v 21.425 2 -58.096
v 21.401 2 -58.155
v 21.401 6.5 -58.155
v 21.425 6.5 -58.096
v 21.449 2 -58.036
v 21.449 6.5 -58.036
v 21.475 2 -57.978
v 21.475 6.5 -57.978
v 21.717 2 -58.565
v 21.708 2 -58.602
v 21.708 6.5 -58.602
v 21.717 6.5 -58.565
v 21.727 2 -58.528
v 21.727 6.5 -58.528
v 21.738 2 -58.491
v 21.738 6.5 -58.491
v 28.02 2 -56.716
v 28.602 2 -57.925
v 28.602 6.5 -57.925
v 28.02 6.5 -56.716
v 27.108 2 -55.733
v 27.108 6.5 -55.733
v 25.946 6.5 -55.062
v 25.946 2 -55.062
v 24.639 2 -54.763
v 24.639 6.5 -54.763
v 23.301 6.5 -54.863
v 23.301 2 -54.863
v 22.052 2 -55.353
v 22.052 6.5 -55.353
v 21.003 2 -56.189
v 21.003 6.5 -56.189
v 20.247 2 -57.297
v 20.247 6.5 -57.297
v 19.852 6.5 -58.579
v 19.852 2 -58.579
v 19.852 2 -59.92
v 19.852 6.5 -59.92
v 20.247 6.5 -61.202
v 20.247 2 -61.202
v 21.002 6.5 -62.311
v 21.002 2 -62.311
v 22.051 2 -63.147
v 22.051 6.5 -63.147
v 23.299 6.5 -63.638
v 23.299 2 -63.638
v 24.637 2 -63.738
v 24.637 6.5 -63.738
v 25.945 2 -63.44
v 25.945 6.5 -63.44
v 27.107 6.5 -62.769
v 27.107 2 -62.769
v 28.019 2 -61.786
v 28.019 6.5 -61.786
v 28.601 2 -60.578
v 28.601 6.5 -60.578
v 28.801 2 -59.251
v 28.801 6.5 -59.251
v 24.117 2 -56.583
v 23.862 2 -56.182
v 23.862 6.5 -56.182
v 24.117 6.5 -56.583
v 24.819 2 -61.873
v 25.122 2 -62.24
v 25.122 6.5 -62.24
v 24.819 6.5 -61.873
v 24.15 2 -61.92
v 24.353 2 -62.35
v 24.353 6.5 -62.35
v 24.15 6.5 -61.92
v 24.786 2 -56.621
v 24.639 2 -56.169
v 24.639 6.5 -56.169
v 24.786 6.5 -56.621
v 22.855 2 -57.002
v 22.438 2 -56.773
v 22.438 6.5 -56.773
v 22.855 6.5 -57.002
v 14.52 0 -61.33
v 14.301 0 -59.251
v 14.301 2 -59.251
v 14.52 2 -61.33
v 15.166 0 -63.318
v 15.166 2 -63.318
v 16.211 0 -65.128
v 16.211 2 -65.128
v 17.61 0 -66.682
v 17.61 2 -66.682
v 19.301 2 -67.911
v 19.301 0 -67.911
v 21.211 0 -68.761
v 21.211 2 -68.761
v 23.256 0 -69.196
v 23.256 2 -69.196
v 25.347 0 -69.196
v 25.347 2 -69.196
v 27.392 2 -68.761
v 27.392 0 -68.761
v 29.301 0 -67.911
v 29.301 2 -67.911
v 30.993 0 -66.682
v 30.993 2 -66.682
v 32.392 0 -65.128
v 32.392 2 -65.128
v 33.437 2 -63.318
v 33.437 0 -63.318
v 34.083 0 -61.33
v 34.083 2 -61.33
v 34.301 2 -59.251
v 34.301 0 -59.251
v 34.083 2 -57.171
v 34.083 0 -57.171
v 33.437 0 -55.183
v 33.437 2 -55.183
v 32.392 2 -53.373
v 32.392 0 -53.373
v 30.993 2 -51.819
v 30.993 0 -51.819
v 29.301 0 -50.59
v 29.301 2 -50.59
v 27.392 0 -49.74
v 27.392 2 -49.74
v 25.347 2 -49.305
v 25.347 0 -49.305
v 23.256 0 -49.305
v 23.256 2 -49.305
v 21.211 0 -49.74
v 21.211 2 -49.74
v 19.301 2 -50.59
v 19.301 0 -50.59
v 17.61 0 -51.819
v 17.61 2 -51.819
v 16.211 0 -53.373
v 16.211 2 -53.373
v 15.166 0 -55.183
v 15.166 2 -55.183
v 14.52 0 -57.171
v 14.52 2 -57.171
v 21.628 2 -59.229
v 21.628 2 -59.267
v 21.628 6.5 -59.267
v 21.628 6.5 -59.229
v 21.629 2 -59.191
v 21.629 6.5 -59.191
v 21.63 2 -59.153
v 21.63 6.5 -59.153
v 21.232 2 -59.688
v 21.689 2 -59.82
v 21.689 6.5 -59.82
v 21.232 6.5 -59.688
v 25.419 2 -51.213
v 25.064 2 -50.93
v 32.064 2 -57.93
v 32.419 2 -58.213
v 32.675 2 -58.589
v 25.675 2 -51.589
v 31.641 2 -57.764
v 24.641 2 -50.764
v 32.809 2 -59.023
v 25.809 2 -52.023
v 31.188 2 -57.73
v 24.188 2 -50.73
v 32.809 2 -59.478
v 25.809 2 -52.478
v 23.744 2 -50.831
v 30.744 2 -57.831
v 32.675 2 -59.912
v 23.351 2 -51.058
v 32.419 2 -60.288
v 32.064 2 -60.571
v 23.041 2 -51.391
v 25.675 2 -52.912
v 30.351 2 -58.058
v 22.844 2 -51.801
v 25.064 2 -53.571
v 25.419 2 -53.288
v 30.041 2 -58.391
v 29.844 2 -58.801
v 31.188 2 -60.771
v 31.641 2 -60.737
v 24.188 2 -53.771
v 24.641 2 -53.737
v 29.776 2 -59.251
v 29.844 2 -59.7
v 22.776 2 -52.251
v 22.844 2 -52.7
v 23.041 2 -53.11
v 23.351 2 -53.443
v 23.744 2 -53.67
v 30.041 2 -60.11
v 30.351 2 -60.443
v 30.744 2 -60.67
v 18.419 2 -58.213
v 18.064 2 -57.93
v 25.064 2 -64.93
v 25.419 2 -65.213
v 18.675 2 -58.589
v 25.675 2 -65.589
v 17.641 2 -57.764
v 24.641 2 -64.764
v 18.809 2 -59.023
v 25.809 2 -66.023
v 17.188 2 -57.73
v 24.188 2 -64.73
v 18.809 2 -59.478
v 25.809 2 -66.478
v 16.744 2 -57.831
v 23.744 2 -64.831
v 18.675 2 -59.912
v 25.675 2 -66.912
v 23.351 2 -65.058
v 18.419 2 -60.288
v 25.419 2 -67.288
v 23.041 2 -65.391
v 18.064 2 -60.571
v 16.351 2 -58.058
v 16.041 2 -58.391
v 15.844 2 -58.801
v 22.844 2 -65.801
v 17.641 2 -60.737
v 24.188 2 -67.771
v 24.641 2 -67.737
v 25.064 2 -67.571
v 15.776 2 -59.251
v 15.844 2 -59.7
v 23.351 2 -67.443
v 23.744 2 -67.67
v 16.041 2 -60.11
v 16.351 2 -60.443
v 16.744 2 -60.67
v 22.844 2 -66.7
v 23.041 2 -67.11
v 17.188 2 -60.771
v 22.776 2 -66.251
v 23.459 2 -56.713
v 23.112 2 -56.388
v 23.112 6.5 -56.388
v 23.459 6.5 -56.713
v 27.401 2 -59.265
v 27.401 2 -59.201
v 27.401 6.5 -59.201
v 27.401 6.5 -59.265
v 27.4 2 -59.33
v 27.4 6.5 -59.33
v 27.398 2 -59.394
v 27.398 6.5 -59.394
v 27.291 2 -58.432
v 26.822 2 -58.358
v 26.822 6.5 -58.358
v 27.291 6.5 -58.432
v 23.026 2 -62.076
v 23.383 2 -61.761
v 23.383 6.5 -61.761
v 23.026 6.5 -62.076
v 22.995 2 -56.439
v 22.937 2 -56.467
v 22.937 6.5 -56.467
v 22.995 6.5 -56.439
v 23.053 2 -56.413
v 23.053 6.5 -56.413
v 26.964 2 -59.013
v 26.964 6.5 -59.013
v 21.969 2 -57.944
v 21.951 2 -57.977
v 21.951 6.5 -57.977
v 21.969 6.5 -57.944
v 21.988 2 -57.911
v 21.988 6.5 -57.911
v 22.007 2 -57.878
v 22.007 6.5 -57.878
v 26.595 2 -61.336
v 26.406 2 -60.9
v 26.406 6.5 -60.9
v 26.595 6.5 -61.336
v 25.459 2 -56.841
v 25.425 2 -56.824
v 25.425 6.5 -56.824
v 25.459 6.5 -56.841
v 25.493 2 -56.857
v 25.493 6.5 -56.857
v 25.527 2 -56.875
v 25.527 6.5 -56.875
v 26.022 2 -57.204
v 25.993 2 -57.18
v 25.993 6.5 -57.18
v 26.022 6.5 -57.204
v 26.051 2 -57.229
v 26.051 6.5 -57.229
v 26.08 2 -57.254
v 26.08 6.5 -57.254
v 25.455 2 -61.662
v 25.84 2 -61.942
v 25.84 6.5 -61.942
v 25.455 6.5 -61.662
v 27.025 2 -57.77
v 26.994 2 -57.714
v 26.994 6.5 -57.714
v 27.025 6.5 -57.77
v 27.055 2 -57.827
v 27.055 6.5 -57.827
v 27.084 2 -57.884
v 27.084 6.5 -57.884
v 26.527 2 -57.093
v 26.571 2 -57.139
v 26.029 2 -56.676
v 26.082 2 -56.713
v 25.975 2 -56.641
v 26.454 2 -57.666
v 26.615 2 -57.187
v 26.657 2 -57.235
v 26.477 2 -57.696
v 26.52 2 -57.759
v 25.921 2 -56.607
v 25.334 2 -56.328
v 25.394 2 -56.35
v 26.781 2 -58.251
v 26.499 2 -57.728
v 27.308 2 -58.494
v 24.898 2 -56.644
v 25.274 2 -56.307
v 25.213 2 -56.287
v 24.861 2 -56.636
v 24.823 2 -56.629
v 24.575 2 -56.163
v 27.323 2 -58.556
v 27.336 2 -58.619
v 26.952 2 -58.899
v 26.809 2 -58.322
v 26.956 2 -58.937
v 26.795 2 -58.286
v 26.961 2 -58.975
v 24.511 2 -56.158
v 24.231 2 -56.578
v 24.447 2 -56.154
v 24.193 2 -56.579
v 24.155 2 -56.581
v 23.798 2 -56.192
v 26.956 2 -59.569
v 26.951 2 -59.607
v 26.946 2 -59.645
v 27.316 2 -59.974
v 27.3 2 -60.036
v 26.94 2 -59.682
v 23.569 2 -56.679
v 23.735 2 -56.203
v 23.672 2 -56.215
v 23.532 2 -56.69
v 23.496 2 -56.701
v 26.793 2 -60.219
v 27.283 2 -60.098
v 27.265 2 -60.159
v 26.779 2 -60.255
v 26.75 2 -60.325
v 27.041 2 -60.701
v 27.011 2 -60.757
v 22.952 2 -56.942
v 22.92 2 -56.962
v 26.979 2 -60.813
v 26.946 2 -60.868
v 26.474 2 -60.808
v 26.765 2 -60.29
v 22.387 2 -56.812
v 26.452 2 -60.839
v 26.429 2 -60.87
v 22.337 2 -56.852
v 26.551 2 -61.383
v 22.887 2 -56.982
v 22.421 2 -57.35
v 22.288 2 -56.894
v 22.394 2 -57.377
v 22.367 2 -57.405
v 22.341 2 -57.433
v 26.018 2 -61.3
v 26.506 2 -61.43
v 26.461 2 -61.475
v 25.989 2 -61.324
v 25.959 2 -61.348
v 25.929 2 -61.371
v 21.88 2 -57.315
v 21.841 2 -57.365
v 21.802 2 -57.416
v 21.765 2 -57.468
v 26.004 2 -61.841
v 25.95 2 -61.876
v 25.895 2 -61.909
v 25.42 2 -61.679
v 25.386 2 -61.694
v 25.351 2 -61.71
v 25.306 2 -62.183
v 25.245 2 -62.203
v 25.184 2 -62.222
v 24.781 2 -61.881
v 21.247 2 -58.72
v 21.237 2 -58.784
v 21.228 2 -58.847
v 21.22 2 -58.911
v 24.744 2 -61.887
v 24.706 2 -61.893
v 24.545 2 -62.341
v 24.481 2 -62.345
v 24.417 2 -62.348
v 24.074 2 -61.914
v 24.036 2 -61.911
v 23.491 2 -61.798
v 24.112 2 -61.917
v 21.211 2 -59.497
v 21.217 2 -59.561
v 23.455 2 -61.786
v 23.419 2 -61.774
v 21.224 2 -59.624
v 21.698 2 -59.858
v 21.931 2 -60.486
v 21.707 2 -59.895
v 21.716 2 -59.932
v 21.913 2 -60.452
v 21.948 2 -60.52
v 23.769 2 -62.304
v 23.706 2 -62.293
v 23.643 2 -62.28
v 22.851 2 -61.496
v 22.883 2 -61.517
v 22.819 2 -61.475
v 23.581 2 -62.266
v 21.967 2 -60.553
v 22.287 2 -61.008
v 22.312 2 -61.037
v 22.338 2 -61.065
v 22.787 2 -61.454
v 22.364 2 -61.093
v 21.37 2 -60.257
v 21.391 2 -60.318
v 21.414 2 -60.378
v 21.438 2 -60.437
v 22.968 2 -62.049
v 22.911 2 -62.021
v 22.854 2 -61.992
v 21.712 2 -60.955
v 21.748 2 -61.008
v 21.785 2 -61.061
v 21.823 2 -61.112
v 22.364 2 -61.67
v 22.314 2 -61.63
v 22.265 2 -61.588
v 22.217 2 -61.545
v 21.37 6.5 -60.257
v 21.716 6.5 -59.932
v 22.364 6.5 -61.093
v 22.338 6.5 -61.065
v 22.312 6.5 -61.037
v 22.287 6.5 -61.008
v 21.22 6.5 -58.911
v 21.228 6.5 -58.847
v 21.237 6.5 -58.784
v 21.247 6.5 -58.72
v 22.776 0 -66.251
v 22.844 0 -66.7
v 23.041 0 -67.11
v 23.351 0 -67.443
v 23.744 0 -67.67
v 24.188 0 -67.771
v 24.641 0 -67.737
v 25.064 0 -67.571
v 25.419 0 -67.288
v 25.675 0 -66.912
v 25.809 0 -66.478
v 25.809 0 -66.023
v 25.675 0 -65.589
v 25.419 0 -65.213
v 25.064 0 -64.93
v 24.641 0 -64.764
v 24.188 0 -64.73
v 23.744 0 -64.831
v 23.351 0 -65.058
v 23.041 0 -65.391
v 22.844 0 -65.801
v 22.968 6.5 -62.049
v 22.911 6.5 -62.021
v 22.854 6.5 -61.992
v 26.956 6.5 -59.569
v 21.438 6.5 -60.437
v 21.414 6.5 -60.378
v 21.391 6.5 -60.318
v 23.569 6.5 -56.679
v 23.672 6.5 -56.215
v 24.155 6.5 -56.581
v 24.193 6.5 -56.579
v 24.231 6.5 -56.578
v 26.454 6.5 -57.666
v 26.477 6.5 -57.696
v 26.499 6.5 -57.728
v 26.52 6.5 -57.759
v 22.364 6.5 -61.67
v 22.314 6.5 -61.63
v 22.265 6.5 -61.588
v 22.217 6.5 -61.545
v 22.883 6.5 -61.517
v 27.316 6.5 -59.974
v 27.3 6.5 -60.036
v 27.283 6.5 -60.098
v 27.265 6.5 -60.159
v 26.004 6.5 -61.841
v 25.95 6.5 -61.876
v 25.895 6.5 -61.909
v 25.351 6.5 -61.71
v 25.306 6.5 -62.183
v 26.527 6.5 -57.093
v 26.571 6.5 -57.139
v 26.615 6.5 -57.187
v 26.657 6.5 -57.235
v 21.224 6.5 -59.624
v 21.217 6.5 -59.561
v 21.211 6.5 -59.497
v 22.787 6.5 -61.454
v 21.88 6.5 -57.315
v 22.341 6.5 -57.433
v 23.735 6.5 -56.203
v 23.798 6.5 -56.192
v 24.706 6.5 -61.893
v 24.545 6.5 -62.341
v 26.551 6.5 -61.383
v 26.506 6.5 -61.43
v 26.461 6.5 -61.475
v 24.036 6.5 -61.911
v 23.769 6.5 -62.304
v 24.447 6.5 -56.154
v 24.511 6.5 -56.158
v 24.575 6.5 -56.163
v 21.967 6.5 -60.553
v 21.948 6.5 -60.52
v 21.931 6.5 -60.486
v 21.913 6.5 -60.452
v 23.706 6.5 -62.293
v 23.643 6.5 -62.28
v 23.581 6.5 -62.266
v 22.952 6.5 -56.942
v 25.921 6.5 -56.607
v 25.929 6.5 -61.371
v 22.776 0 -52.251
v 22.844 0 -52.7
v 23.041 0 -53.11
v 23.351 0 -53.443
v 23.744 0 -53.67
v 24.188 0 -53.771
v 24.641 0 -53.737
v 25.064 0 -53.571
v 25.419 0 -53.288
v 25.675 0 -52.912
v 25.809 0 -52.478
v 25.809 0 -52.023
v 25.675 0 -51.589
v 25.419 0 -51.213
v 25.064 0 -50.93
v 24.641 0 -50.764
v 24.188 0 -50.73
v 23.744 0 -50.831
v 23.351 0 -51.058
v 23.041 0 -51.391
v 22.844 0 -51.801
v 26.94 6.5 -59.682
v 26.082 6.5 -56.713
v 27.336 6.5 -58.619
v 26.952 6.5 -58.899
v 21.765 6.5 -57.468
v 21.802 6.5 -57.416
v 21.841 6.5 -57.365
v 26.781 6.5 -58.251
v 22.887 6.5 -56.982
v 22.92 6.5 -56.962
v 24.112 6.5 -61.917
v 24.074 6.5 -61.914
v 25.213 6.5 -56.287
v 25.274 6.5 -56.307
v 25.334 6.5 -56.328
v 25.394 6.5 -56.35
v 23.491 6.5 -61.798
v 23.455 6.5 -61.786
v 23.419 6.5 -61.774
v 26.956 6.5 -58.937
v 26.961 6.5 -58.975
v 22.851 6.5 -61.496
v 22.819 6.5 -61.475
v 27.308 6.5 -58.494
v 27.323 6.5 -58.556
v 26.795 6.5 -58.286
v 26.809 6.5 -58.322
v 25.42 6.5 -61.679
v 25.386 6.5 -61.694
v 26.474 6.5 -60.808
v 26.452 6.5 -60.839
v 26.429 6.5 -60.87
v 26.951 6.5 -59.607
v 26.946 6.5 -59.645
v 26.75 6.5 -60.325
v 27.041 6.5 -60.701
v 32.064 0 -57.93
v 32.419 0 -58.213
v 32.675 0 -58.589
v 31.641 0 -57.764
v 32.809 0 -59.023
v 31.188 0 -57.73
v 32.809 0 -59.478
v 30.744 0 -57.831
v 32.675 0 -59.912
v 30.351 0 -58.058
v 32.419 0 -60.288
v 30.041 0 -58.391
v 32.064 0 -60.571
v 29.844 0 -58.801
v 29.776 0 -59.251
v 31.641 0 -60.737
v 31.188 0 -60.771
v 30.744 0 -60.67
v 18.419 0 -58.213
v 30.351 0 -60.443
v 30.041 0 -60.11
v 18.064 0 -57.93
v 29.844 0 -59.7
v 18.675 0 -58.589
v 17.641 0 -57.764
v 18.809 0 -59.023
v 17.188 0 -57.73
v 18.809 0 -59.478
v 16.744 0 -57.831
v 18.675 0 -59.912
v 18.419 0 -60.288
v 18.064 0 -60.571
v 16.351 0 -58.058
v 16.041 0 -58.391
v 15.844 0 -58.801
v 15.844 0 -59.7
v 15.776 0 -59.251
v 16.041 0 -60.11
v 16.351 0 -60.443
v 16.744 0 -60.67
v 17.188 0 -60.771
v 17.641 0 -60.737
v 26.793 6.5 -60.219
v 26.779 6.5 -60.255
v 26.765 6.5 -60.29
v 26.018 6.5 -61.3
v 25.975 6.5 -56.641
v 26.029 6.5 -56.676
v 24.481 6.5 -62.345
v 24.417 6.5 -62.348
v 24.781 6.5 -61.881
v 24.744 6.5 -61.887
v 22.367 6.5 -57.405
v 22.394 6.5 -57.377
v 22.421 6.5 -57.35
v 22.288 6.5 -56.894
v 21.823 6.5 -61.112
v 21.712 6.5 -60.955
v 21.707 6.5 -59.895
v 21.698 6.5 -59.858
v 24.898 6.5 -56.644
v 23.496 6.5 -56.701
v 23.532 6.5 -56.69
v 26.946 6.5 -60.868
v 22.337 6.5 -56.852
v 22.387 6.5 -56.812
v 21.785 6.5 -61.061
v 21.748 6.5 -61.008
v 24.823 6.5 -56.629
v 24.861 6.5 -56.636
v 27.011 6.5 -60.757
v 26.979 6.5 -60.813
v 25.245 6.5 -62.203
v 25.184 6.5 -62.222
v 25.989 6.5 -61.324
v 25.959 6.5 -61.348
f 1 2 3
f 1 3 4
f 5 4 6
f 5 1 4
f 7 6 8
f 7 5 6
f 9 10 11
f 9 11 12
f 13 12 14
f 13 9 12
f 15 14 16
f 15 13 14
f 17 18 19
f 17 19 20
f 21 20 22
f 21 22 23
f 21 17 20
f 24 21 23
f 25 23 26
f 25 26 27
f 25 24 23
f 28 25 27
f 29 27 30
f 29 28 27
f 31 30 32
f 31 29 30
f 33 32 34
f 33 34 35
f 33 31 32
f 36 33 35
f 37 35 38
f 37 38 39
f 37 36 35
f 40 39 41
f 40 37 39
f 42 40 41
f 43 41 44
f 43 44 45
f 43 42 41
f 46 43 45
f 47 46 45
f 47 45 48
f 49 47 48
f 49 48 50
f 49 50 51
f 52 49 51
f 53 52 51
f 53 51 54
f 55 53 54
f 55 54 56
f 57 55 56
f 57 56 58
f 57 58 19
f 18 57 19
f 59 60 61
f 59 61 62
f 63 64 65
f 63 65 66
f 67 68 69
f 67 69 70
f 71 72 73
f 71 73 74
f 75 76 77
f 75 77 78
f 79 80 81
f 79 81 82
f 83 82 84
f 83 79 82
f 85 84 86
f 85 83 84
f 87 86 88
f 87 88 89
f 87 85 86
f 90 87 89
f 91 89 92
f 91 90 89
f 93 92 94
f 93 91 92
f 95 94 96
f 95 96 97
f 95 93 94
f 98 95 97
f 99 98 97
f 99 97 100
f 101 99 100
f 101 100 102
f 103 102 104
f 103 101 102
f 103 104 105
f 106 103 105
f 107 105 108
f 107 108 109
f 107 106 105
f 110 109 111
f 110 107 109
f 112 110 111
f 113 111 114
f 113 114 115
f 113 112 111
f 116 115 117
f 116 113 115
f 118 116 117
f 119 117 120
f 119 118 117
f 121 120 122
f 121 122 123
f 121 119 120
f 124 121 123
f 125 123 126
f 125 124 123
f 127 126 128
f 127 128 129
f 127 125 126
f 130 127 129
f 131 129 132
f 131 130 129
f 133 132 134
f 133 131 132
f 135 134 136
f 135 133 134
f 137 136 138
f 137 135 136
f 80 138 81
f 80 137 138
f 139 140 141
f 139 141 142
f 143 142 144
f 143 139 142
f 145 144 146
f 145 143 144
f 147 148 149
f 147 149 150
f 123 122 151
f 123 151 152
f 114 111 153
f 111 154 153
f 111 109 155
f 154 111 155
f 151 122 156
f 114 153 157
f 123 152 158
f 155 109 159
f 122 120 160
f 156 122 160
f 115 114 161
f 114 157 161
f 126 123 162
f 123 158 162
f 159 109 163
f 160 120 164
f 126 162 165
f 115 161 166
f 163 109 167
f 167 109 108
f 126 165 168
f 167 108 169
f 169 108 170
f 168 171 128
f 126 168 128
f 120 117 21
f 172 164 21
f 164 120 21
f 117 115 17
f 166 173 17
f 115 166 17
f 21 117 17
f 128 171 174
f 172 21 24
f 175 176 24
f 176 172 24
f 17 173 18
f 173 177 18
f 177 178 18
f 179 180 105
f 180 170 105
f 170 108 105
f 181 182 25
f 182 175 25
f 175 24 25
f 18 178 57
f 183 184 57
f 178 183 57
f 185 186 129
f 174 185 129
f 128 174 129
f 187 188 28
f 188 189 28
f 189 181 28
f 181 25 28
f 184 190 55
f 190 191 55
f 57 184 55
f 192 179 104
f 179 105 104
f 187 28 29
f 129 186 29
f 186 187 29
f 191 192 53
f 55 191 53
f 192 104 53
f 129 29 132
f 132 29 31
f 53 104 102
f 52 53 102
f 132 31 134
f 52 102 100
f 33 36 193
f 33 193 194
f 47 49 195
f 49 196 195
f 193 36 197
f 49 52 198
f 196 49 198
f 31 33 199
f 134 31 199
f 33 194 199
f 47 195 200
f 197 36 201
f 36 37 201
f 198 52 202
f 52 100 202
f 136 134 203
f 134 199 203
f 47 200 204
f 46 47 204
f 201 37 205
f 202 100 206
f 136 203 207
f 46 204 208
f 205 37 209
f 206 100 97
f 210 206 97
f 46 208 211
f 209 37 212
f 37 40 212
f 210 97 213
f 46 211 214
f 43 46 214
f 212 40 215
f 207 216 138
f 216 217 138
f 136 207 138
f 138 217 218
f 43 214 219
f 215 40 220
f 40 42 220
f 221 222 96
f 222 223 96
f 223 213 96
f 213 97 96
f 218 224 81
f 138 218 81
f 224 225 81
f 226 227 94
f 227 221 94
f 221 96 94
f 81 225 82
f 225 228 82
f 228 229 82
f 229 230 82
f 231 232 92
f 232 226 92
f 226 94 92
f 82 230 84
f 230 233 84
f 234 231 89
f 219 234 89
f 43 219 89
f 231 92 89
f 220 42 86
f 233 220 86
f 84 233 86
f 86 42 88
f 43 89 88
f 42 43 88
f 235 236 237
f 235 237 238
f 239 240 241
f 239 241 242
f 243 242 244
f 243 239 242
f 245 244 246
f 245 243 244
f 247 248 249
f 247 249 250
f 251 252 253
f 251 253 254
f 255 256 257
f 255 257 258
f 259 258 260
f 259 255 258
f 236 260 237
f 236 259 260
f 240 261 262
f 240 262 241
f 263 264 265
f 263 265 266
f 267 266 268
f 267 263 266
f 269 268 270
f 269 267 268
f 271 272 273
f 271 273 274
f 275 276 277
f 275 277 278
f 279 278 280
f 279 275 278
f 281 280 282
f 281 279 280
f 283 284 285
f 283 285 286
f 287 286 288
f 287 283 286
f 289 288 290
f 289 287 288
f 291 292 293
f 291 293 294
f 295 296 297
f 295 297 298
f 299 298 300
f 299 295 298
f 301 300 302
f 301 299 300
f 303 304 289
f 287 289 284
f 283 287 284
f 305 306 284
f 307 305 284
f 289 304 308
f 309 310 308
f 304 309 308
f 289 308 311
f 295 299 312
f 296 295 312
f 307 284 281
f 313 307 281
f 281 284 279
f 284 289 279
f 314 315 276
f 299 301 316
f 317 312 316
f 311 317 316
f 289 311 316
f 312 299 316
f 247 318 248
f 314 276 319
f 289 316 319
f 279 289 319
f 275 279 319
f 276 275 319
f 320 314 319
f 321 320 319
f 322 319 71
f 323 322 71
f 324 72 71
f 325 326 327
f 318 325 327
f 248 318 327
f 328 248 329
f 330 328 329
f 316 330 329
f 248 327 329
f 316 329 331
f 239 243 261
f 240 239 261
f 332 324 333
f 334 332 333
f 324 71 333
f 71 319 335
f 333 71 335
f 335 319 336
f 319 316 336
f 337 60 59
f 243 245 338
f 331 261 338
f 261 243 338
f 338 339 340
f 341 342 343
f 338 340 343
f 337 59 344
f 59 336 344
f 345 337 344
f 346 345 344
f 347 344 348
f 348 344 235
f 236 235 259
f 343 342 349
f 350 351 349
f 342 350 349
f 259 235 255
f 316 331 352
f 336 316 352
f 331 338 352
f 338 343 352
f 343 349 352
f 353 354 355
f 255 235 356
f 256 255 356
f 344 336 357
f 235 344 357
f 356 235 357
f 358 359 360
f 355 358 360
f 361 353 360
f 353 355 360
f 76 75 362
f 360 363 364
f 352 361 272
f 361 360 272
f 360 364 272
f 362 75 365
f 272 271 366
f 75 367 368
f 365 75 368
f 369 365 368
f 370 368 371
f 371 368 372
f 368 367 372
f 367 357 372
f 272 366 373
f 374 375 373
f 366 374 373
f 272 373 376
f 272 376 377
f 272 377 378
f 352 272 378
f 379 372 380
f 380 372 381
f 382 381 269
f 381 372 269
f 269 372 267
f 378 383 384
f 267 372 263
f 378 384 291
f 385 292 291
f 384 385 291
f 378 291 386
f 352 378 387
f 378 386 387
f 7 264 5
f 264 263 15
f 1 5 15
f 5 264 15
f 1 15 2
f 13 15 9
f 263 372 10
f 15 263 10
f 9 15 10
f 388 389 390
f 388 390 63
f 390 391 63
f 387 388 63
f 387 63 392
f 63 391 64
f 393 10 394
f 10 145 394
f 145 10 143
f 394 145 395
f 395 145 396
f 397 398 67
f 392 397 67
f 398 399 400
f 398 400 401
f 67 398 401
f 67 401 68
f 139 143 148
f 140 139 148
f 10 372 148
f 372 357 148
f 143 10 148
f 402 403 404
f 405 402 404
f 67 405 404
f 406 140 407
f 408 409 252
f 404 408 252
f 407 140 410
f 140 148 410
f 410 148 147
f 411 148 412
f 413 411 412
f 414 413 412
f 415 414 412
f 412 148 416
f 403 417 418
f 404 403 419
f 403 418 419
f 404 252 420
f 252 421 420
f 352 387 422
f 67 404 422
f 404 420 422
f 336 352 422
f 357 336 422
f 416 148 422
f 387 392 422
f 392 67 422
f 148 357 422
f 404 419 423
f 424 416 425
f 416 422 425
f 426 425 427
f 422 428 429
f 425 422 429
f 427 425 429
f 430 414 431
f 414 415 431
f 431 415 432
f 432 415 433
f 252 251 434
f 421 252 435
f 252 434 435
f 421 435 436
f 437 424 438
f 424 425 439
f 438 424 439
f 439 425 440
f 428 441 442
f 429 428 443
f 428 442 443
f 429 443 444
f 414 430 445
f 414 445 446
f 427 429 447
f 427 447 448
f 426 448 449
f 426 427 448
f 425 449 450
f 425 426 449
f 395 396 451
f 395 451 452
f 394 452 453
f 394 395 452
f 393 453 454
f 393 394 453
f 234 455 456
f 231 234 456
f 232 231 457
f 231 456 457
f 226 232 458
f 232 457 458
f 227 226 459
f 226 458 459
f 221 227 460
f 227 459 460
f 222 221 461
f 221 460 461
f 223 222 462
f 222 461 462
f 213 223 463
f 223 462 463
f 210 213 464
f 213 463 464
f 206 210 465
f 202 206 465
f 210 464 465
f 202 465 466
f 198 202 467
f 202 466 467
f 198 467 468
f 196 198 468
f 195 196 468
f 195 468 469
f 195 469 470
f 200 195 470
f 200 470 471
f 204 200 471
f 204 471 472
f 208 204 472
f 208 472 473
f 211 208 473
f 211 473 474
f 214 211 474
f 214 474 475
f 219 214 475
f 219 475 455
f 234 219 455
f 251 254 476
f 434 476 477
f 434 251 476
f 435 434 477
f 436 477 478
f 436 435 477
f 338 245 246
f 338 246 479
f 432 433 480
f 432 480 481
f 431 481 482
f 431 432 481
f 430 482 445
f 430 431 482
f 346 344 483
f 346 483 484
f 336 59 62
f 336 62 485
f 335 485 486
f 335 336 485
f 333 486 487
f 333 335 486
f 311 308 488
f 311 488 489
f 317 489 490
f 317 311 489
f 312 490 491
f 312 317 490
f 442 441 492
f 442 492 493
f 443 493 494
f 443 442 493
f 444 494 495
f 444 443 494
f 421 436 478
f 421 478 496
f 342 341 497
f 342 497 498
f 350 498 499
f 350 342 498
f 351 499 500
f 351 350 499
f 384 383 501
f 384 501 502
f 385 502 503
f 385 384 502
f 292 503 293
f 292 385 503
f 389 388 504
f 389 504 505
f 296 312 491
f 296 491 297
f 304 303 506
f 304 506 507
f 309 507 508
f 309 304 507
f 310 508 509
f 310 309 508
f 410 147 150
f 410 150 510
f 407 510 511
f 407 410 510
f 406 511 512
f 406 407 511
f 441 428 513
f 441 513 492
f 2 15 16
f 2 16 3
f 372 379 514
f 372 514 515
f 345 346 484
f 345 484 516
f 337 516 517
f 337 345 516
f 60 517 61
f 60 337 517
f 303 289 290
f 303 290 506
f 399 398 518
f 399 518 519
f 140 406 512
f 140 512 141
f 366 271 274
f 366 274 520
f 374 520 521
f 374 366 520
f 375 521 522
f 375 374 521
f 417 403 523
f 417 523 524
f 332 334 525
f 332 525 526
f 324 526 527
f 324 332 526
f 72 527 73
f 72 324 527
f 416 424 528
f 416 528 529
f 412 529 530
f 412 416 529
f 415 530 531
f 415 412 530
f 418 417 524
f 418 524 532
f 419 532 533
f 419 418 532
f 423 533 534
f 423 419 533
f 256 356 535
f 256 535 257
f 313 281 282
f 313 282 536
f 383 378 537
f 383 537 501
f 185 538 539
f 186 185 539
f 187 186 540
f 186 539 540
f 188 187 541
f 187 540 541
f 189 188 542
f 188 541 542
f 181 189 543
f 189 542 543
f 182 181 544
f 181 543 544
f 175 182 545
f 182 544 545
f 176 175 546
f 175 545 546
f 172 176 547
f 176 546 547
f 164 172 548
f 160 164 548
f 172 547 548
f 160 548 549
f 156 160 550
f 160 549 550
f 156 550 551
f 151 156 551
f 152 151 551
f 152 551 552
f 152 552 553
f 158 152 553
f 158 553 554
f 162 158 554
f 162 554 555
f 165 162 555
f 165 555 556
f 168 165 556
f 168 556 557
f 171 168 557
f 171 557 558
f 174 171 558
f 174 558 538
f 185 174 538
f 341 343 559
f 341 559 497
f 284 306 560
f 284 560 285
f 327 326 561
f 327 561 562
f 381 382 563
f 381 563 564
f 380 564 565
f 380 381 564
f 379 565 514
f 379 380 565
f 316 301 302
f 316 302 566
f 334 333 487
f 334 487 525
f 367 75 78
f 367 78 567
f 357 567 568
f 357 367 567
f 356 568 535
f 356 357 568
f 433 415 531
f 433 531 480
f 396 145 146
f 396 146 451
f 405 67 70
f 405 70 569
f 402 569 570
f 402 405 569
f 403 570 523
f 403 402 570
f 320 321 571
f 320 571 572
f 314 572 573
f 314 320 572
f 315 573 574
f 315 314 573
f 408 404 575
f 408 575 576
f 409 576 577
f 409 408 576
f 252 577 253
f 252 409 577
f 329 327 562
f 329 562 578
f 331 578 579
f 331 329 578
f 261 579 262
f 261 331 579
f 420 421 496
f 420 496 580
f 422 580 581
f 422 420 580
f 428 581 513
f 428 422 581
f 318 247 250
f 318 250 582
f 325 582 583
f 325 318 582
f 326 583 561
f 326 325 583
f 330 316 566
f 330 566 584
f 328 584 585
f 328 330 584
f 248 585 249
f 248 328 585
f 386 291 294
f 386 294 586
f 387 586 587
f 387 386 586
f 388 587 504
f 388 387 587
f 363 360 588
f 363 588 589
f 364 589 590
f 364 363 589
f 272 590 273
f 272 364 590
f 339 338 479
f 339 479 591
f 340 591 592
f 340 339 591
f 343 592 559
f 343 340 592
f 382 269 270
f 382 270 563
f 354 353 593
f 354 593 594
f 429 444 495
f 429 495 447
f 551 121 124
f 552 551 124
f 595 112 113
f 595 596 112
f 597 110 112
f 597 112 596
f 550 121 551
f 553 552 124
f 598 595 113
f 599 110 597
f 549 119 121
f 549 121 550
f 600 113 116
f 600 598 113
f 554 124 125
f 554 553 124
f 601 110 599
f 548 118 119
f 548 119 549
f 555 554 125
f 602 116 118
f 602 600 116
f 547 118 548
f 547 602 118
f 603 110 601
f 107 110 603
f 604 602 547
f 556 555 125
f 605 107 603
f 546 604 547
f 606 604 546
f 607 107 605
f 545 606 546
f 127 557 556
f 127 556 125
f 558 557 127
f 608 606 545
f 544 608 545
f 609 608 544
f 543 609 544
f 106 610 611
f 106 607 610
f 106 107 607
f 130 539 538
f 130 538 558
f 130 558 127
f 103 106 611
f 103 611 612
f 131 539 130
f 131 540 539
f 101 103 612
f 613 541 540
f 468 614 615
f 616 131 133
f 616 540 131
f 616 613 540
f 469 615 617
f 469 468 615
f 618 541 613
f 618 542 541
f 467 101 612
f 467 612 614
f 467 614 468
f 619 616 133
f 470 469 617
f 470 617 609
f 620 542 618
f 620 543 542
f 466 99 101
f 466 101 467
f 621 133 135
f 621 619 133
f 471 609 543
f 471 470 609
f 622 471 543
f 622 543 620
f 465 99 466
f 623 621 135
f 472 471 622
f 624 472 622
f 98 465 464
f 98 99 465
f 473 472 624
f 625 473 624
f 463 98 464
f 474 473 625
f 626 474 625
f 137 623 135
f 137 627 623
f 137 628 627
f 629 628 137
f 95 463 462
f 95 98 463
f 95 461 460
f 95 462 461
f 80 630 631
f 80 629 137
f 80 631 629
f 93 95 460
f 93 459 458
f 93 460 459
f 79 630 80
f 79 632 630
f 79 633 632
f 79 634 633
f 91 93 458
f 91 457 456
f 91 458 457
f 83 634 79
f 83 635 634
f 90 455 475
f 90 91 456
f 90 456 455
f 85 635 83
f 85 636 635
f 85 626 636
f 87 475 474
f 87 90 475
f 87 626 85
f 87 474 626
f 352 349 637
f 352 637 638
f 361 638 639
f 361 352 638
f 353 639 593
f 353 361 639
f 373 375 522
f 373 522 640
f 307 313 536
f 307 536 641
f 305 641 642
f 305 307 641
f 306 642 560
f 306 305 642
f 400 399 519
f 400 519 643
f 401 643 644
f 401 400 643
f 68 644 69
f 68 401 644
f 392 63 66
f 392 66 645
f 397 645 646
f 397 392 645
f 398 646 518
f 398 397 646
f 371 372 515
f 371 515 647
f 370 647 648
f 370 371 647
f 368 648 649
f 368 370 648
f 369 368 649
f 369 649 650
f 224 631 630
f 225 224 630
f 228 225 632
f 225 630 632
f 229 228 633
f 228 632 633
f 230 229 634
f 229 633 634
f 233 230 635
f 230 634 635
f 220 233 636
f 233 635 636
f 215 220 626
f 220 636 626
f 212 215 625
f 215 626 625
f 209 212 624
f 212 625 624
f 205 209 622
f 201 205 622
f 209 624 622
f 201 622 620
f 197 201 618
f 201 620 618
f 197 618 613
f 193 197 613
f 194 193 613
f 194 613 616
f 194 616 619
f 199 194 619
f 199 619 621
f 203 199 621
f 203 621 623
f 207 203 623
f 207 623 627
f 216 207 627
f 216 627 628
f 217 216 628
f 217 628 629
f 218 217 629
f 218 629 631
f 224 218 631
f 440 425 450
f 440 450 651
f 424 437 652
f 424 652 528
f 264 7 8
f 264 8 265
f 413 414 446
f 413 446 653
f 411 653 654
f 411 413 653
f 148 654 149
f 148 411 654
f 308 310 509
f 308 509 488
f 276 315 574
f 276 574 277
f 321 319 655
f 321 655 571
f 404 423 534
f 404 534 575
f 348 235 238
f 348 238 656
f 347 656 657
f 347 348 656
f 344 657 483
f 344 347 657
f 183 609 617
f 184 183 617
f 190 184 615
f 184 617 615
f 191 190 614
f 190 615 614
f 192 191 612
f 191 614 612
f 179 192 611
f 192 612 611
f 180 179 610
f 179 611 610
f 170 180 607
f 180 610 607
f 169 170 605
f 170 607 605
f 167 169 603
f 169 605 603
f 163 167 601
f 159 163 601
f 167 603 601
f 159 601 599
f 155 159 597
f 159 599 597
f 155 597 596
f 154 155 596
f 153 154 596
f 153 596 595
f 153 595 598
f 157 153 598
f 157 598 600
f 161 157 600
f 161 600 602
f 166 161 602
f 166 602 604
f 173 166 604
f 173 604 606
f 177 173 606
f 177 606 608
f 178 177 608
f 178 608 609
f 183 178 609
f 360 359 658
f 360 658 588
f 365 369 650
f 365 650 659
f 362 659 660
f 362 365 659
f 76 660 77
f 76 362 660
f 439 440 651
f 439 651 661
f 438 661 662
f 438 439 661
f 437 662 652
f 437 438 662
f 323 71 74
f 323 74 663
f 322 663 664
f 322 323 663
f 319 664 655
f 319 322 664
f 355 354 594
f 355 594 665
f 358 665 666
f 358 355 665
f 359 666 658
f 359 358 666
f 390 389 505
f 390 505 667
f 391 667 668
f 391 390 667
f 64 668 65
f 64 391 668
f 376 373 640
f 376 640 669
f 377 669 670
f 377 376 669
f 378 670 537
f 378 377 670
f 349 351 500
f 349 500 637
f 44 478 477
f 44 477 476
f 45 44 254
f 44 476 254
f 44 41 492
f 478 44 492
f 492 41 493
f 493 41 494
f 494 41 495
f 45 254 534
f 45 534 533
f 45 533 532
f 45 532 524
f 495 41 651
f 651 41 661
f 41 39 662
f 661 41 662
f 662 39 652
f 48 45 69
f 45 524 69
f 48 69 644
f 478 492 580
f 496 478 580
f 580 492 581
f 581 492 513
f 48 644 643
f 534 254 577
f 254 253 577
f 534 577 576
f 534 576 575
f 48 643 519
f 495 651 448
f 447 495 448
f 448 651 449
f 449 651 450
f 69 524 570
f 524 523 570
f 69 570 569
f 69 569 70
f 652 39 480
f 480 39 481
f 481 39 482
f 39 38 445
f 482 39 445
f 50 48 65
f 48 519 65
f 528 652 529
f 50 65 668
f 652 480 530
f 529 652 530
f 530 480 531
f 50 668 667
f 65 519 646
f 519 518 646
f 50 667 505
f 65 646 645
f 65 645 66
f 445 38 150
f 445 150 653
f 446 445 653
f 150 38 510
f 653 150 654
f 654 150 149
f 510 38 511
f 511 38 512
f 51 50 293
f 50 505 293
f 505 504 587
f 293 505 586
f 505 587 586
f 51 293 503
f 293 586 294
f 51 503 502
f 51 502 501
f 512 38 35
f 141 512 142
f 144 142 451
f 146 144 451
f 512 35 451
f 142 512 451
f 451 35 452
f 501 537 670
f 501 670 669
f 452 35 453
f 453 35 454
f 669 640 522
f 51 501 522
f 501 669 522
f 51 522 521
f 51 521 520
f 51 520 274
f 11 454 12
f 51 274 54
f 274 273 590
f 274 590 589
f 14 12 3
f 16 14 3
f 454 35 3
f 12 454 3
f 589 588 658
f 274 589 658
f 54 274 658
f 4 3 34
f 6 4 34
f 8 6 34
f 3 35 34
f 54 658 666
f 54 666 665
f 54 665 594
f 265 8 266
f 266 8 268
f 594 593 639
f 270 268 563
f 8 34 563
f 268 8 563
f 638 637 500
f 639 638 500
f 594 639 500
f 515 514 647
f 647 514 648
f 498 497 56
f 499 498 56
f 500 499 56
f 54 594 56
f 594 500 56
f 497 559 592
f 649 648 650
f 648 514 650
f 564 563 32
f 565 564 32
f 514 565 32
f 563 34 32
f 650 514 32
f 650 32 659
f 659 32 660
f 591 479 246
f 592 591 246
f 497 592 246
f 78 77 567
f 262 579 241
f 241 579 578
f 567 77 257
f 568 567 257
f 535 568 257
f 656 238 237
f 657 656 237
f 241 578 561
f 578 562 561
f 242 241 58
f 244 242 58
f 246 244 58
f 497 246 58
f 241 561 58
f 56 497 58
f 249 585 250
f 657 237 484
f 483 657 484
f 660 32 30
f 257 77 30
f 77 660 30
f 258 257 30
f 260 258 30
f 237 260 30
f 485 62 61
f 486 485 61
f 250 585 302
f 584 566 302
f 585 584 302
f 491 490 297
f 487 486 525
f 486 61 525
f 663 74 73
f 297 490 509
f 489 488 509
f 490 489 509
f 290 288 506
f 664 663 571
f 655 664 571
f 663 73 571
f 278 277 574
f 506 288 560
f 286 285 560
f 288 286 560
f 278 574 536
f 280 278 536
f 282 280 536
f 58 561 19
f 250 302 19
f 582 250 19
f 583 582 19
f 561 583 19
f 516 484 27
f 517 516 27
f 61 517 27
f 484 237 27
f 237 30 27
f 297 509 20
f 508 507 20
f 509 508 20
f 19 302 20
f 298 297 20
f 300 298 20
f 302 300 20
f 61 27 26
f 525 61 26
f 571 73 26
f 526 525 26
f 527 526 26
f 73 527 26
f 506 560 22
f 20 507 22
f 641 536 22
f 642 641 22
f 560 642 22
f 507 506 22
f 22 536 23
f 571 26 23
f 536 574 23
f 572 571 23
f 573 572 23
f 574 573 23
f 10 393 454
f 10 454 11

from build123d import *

# Parameters (mm, degrees)
SKETCH1_R           = 4.5
BOSS_EXTRUDE1_DEPTH = 6.5
SKETCH2_R           = 10
BOSS_EXTRUDE2_DEPTH = 2
SKETCH3_R           = 1.525
CUT_EXTRUDE1_DEPTH  = 7.5


with BuildPart() as part:
    # Sketch1 → Boss-Extrude1 (new body)
    with BuildSketch(Plane(origin=(24.301487189, 0, -59.250523978), x_dir=(0.955627849, 0, 0.29457667), z_dir=(0, -1, 0))):
        Circle(SKETCH1_R)
        with BuildLine():
            Line((-1.743463309, 2.563266606), (-1.337804671, 2.314678673))
            ThreePointArc((-1.337804671, 2.314678673), (-1.287955514, 2.342782383), (-1.237516253, 2.369812698))
            Line((-1.237516253, 2.369812698), (-1.230043219, 2.845521688))
            ThreePointArc((-1.230043219, 2.845521688), (-1.141186113, 2.882307106), (-1.05123072, 2.916318565))
            Line((-1.05123072, 2.916318565), (-0.7201379, 2.574657279))
            ThreePointArc((-0.7201379, 2.574657279), (-0.664865737, 2.589481077), (-0.609288952, 2.603118451))
            Line((-0.609288952, 2.603118451), (-0.483746682, 3.062023701))
            ThreePointArc((-0.483746682, 3.062023701), (-0.388533024, 3.075555574), (-0.292945439, 3.086127504))
            Line((-0.292945439, 3.086127504), (-0.057222215, 2.672860699))
            ThreePointArc((-0.057222215, 2.672860699), (0, 2.673473153), (0.057222215, 2.672860699))
            Line((0.057222215, 2.672860699), (0.292945439, 3.086127504))
            ThreePointArc((0.292945439, 3.086127504), (0.388533024, 3.075555574), (0.483746682, 3.062023701))
            Line((0.483746682, 3.062023701), (0.609288952, 2.603118451))
            ThreePointArc((0.609288952, 2.603118451), (0.664865737, 2.589481077), (0.7201379, 2.574657279))
            Line((0.7201379, 2.574657279), (1.05123072, 2.916318565))
            ThreePointArc((1.05123072, 2.916318565), (1.141186113, 2.882307106), (1.230043219, 2.845521688))
            Line((1.230043219, 2.845521688), (1.237516253, 2.369812698))
            ThreePointArc((1.237516253, 2.369812698), (1.287955514, 2.342782383), (1.337804671, 2.314678673))
            Line((1.337804671, 2.314678673), (1.743463309, 2.563266606))
            ThreePointArc((1.743463309, 2.563266606), (1.822134282, 2.507952683), (1.899051617, 2.450225083))
            Line((1.899051617, 2.450225083), (1.787985857, 1.987602897))
            ThreePointArc((1.787985857, 1.987602897), (1.830118309, 1.948878055), (1.871412256, 1.909260293))
            Line((1.871412256, 1.909260293), (2.326147686, 2.049155178))
            ThreePointArc((2.326147686, 2.049155178), (2.388591053, 1.976014368), (2.448735618, 1.900971824))
            Line((2.448735618, 1.900971824), (2.226109733, 1.480504696))
            ThreePointArc((2.226109733, 1.480504696), (2.257288041, 1.432518551), (2.287432125, 1.383876068))
            Line((2.287432125, 1.383876068), (2.762671649, 1.406287795))
            ThreePointArc((2.762671649, 1.406287795), (2.804963863, 1.319915804), (2.844556554, 1.232273514))
            Line((2.844556554, 1.232273514), (2.524358948, 0.88038094))
            ThreePointArc((2.524358948, 0.88038094), (2.542624063, 0.826148638), (2.559724222, 0.771537819))
            Line((2.559724222, 0.771537819), (3.025606792, 0.675058177))
            ThreePointArc((3.025606792, 0.675058177), (3.045090477, 0.580882075), (3.06164354, 0.486146927))
            Line((3.06164354, 0.486146927), (2.663993406, 0.224939612))
            ThreePointArc((2.663993406, 0.224939612), (2.668197664, 0.167868768), (2.671179432, 0.110721012))
            Line((2.671179432, 0.110721012), (3.098431932, -0.098587829))
            ThreePointArc((3.098431932, -0.098587829), (3.093882858, -0.194650611), (3.086356203, -0.290526059))
            Line((3.086356203, -0.290526059), (2.636239362, -0.444635499))
            ThreePointArc((2.636239362, -0.444635499), (2.626118593, -0.500958914), (2.614794614, -0.557052804))
            Line((2.614794614, -0.557052804), (2.9765712, -0.866039198))
            ThreePointArc((2.9765712, -0.866039198), (2.948275201, -0.957952683), (2.917141754, -1.048944224))
            Line((2.917141754, -1.048944224), (2.442840702, -1.086272527))
            ThreePointArc((2.442840702, -1.086272527), (2.419030833, -1.138309505), (2.394112634, -1.189824943))
            Line((2.394112634, -1.189824943), (2.667681551, -1.57907414))
            ThreePointArc((2.667681551, -1.57907414), (2.617416569, -1.661063064), (2.564632561, -1.741453366))
            Line((2.564632561, -1.741453366), (2.095949377, -1.659655056))
            ThreePointArc((2.095949377, -1.659655056), (2.059946468, -1.704135923), (2.022999752, -1.747836005))
            Line((2.022999752, -1.747836005), (2.19117166, -2.192890046))
            ThreePointArc((2.19117166, -2.192890046), (2.122096028, -2.259802745), (2.050978072, -2.324540589))
            Line((2.050978072, -2.324540589), (1.617361845, -2.128755355))
            ThreePointArc((1.617361845, -2.128755355), (1.571428092, -2.162885215), (1.524774356, -2.196024103))
            Line((1.524774356, -2.196024103), (1.576982395, -2.668918606))
            ThreePointArc((1.576982395, -2.668918606), (1.49343639, -2.716550708), (1.408453087, -2.761568377))
            Line((1.408453087, -2.761568377), (1.037149519, -2.464098126))
            ThreePointArc((1.037149519, -2.464098126), (0.984171108, -2.485732473), (0.930741779, -2.50622793))
            Line((0.930741779, -2.50622793), (0.863705526, -2.977249194))
            ThreePointArc((0.863705526, -2.977249194), (0.77093865, -3.002607799), (0.677429816, -3.025076668))
            Line((0.677429816, -3.025076668), (0.391769275, -2.644612549))
            ThreePointArc((0.391769275, -2.644612549), (0.335075035, -2.652392018), (0.278227274, -2.658956239))
            Line((0.278227274, -2.658956239), (0.096158863, -3.098508266))
            ThreePointArc((0.096158863, -3.098508266), (0, -3.1), (-0.096158863, -3.098508266))
            Line((-0.096158863, -3.098508266), (-0.278227274, -2.658956239))
            ThreePointArc((-0.278227274, -2.658956239), (-0.335075035, -2.652392018), (-0.391769275, -2.644612549))
            Line((-0.391769275, -2.644612549), (-0.677429816, -3.025076668))
            ThreePointArc((-0.677429816, -3.025076668), (-0.77093865, -3.002607799), (-0.863705526, -2.977249194))
            Line((-0.863705526, -2.977249194), (-0.930741779, -2.50622793))
            ThreePointArc((-0.930741779, -2.50622793), (-0.984171108, -2.485732473), (-1.037149519, -2.464098126))
            Line((-1.037149519, -2.464098126), (-1.408453087, -2.761568377))
            ThreePointArc((-1.408453087, -2.761568377), (-1.49343639, -2.716550708), (-1.576982395, -2.668918606))
            Line((-1.576982395, -2.668918606), (-1.524774356, -2.196024103))
            ThreePointArc((-1.524774356, -2.196024103), (-1.571428092, -2.162885215), (-1.617361845, -2.128755355))
            Line((-1.617361845, -2.128755355), (-2.050978072, -2.324540589))
            ThreePointArc((-2.050978072, -2.324540589), (-2.122096028, -2.259802745), (-2.19117166, -2.192890046))
            Line((-2.19117166, -2.192890046), (-2.022999752, -1.747836005))
            ThreePointArc((-2.022999752, -1.747836005), (-2.059946468, -1.704135923), (-2.095949377, -1.659655056))
            Line((-2.095949377, -1.659655056), (-2.564632561, -1.741453366))
            ThreePointArc((-2.564632561, -1.741453366), (-2.617416569, -1.661063064), (-2.667681551, -1.57907414))
            Line((-2.667681551, -1.57907414), (-2.394112634, -1.189824943))
            ThreePointArc((-2.394112634, -1.189824943), (-2.419030833, -1.138309505), (-2.442840702, -1.086272527))
            Line((-2.442840702, -1.086272527), (-2.917141754, -1.048944224))
            ThreePointArc((-2.917141754, -1.048944224), (-2.948275201, -0.957952683), (-2.9765712, -0.866039198))
            Line((-2.9765712, -0.866039198), (-2.614794614, -0.557052804))
            ThreePointArc((-2.614794614, -0.557052804), (-2.626118593, -0.500958914), (-2.636239362, -0.444635499))
            Line((-2.636239362, -0.444635499), (-3.086356203, -0.290526059))
            ThreePointArc((-3.086356203, -0.290526059), (-3.093882858, -0.194650611), (-3.098431932, -0.098587829))
            Line((-3.098431932, -0.098587829), (-2.671179432, 0.110721012))
            ThreePointArc((-2.671179432, 0.110721012), (-2.668197664, 0.167868768), (-2.663993406, 0.224939612))
            Line((-2.663993406, 0.224939612), (-3.06164354, 0.486146927))
            ThreePointArc((-3.06164354, 0.486146927), (-3.045090477, 0.580882075), (-3.025606792, 0.675058177))
            Line((-3.025606792, 0.675058177), (-2.559724222, 0.771537819))
            ThreePointArc((-2.559724222, 0.771537819), (-2.542624063, 0.826148638), (-2.524358948, 0.88038094))
            Line((-2.524358948, 0.88038094), (-2.844556554, 1.232273514))
            ThreePointArc((-2.844556554, 1.232273514), (-2.804963863, 1.319915804), (-2.762671649, 1.406287795))
            Line((-2.762671649, 1.406287795), (-2.287432125, 1.383876068))
            ThreePointArc((-2.287432125, 1.383876068), (-2.257288041, 1.432518551), (-2.226109733, 1.480504696))
            Line((-2.226109733, 1.480504696), (-2.448735618, 1.900971824))
            ThreePointArc((-2.448735618, 1.900971824), (-2.388591053, 1.976014368), (-2.326147686, 2.049155178))
            Line((-2.326147686, 2.049155178), (-1.871412256, 1.909260293))
            ThreePointArc((-1.871412256, 1.909260293), (-1.830118309, 1.948878055), (-1.787985857, 1.987602897))
            Line((-1.787985857, 1.987602897), (-1.899051617, 2.450225083))
            ThreePointArc((-1.899051617, 2.450225083), (-1.822134282, 2.507952683), (-1.743463309, 2.563266606))
        make_face(mode=Mode.SUBTRACT)
    extrude(amount=-BOSS_EXTRUDE1_DEPTH)

    # Sketch2 → Boss-Extrude2 (add)
    with BuildSketch(Plane(origin=(0, 0, 0), x_dir=(-1, 0, 0), z_dir=(0, -1, 0))):
        with Locations((-24.301487189, 59.250523978)):
            Circle(SKETCH2_R)
    extrude(amount=-BOSS_EXTRUDE2_DEPTH)

    # Sketch3 → Cut-Extrude1 (cut, through all)
    with BuildSketch(Plane(origin=(0, 0, 0), x_dir=(-1, 0, 0), z_dir=(0, -1, 0))):
        with Locations((-24.301487189, 66.250523978)):
            Circle(SKETCH3_R)
        with Locations((-17.301487189, 59.250523978)):
            Circle(SKETCH3_R)
        with Locations((-24.301487189, 52.250523978)):
            Circle(SKETCH3_R)
        with Locations((-31.301487189, 59.250523978)):
            Circle(SKETCH3_R)
    extrude(amount=-CUT_EXTRUDE1_DEPTH, mode=Mode.SUBTRACT)


solid = part.part
